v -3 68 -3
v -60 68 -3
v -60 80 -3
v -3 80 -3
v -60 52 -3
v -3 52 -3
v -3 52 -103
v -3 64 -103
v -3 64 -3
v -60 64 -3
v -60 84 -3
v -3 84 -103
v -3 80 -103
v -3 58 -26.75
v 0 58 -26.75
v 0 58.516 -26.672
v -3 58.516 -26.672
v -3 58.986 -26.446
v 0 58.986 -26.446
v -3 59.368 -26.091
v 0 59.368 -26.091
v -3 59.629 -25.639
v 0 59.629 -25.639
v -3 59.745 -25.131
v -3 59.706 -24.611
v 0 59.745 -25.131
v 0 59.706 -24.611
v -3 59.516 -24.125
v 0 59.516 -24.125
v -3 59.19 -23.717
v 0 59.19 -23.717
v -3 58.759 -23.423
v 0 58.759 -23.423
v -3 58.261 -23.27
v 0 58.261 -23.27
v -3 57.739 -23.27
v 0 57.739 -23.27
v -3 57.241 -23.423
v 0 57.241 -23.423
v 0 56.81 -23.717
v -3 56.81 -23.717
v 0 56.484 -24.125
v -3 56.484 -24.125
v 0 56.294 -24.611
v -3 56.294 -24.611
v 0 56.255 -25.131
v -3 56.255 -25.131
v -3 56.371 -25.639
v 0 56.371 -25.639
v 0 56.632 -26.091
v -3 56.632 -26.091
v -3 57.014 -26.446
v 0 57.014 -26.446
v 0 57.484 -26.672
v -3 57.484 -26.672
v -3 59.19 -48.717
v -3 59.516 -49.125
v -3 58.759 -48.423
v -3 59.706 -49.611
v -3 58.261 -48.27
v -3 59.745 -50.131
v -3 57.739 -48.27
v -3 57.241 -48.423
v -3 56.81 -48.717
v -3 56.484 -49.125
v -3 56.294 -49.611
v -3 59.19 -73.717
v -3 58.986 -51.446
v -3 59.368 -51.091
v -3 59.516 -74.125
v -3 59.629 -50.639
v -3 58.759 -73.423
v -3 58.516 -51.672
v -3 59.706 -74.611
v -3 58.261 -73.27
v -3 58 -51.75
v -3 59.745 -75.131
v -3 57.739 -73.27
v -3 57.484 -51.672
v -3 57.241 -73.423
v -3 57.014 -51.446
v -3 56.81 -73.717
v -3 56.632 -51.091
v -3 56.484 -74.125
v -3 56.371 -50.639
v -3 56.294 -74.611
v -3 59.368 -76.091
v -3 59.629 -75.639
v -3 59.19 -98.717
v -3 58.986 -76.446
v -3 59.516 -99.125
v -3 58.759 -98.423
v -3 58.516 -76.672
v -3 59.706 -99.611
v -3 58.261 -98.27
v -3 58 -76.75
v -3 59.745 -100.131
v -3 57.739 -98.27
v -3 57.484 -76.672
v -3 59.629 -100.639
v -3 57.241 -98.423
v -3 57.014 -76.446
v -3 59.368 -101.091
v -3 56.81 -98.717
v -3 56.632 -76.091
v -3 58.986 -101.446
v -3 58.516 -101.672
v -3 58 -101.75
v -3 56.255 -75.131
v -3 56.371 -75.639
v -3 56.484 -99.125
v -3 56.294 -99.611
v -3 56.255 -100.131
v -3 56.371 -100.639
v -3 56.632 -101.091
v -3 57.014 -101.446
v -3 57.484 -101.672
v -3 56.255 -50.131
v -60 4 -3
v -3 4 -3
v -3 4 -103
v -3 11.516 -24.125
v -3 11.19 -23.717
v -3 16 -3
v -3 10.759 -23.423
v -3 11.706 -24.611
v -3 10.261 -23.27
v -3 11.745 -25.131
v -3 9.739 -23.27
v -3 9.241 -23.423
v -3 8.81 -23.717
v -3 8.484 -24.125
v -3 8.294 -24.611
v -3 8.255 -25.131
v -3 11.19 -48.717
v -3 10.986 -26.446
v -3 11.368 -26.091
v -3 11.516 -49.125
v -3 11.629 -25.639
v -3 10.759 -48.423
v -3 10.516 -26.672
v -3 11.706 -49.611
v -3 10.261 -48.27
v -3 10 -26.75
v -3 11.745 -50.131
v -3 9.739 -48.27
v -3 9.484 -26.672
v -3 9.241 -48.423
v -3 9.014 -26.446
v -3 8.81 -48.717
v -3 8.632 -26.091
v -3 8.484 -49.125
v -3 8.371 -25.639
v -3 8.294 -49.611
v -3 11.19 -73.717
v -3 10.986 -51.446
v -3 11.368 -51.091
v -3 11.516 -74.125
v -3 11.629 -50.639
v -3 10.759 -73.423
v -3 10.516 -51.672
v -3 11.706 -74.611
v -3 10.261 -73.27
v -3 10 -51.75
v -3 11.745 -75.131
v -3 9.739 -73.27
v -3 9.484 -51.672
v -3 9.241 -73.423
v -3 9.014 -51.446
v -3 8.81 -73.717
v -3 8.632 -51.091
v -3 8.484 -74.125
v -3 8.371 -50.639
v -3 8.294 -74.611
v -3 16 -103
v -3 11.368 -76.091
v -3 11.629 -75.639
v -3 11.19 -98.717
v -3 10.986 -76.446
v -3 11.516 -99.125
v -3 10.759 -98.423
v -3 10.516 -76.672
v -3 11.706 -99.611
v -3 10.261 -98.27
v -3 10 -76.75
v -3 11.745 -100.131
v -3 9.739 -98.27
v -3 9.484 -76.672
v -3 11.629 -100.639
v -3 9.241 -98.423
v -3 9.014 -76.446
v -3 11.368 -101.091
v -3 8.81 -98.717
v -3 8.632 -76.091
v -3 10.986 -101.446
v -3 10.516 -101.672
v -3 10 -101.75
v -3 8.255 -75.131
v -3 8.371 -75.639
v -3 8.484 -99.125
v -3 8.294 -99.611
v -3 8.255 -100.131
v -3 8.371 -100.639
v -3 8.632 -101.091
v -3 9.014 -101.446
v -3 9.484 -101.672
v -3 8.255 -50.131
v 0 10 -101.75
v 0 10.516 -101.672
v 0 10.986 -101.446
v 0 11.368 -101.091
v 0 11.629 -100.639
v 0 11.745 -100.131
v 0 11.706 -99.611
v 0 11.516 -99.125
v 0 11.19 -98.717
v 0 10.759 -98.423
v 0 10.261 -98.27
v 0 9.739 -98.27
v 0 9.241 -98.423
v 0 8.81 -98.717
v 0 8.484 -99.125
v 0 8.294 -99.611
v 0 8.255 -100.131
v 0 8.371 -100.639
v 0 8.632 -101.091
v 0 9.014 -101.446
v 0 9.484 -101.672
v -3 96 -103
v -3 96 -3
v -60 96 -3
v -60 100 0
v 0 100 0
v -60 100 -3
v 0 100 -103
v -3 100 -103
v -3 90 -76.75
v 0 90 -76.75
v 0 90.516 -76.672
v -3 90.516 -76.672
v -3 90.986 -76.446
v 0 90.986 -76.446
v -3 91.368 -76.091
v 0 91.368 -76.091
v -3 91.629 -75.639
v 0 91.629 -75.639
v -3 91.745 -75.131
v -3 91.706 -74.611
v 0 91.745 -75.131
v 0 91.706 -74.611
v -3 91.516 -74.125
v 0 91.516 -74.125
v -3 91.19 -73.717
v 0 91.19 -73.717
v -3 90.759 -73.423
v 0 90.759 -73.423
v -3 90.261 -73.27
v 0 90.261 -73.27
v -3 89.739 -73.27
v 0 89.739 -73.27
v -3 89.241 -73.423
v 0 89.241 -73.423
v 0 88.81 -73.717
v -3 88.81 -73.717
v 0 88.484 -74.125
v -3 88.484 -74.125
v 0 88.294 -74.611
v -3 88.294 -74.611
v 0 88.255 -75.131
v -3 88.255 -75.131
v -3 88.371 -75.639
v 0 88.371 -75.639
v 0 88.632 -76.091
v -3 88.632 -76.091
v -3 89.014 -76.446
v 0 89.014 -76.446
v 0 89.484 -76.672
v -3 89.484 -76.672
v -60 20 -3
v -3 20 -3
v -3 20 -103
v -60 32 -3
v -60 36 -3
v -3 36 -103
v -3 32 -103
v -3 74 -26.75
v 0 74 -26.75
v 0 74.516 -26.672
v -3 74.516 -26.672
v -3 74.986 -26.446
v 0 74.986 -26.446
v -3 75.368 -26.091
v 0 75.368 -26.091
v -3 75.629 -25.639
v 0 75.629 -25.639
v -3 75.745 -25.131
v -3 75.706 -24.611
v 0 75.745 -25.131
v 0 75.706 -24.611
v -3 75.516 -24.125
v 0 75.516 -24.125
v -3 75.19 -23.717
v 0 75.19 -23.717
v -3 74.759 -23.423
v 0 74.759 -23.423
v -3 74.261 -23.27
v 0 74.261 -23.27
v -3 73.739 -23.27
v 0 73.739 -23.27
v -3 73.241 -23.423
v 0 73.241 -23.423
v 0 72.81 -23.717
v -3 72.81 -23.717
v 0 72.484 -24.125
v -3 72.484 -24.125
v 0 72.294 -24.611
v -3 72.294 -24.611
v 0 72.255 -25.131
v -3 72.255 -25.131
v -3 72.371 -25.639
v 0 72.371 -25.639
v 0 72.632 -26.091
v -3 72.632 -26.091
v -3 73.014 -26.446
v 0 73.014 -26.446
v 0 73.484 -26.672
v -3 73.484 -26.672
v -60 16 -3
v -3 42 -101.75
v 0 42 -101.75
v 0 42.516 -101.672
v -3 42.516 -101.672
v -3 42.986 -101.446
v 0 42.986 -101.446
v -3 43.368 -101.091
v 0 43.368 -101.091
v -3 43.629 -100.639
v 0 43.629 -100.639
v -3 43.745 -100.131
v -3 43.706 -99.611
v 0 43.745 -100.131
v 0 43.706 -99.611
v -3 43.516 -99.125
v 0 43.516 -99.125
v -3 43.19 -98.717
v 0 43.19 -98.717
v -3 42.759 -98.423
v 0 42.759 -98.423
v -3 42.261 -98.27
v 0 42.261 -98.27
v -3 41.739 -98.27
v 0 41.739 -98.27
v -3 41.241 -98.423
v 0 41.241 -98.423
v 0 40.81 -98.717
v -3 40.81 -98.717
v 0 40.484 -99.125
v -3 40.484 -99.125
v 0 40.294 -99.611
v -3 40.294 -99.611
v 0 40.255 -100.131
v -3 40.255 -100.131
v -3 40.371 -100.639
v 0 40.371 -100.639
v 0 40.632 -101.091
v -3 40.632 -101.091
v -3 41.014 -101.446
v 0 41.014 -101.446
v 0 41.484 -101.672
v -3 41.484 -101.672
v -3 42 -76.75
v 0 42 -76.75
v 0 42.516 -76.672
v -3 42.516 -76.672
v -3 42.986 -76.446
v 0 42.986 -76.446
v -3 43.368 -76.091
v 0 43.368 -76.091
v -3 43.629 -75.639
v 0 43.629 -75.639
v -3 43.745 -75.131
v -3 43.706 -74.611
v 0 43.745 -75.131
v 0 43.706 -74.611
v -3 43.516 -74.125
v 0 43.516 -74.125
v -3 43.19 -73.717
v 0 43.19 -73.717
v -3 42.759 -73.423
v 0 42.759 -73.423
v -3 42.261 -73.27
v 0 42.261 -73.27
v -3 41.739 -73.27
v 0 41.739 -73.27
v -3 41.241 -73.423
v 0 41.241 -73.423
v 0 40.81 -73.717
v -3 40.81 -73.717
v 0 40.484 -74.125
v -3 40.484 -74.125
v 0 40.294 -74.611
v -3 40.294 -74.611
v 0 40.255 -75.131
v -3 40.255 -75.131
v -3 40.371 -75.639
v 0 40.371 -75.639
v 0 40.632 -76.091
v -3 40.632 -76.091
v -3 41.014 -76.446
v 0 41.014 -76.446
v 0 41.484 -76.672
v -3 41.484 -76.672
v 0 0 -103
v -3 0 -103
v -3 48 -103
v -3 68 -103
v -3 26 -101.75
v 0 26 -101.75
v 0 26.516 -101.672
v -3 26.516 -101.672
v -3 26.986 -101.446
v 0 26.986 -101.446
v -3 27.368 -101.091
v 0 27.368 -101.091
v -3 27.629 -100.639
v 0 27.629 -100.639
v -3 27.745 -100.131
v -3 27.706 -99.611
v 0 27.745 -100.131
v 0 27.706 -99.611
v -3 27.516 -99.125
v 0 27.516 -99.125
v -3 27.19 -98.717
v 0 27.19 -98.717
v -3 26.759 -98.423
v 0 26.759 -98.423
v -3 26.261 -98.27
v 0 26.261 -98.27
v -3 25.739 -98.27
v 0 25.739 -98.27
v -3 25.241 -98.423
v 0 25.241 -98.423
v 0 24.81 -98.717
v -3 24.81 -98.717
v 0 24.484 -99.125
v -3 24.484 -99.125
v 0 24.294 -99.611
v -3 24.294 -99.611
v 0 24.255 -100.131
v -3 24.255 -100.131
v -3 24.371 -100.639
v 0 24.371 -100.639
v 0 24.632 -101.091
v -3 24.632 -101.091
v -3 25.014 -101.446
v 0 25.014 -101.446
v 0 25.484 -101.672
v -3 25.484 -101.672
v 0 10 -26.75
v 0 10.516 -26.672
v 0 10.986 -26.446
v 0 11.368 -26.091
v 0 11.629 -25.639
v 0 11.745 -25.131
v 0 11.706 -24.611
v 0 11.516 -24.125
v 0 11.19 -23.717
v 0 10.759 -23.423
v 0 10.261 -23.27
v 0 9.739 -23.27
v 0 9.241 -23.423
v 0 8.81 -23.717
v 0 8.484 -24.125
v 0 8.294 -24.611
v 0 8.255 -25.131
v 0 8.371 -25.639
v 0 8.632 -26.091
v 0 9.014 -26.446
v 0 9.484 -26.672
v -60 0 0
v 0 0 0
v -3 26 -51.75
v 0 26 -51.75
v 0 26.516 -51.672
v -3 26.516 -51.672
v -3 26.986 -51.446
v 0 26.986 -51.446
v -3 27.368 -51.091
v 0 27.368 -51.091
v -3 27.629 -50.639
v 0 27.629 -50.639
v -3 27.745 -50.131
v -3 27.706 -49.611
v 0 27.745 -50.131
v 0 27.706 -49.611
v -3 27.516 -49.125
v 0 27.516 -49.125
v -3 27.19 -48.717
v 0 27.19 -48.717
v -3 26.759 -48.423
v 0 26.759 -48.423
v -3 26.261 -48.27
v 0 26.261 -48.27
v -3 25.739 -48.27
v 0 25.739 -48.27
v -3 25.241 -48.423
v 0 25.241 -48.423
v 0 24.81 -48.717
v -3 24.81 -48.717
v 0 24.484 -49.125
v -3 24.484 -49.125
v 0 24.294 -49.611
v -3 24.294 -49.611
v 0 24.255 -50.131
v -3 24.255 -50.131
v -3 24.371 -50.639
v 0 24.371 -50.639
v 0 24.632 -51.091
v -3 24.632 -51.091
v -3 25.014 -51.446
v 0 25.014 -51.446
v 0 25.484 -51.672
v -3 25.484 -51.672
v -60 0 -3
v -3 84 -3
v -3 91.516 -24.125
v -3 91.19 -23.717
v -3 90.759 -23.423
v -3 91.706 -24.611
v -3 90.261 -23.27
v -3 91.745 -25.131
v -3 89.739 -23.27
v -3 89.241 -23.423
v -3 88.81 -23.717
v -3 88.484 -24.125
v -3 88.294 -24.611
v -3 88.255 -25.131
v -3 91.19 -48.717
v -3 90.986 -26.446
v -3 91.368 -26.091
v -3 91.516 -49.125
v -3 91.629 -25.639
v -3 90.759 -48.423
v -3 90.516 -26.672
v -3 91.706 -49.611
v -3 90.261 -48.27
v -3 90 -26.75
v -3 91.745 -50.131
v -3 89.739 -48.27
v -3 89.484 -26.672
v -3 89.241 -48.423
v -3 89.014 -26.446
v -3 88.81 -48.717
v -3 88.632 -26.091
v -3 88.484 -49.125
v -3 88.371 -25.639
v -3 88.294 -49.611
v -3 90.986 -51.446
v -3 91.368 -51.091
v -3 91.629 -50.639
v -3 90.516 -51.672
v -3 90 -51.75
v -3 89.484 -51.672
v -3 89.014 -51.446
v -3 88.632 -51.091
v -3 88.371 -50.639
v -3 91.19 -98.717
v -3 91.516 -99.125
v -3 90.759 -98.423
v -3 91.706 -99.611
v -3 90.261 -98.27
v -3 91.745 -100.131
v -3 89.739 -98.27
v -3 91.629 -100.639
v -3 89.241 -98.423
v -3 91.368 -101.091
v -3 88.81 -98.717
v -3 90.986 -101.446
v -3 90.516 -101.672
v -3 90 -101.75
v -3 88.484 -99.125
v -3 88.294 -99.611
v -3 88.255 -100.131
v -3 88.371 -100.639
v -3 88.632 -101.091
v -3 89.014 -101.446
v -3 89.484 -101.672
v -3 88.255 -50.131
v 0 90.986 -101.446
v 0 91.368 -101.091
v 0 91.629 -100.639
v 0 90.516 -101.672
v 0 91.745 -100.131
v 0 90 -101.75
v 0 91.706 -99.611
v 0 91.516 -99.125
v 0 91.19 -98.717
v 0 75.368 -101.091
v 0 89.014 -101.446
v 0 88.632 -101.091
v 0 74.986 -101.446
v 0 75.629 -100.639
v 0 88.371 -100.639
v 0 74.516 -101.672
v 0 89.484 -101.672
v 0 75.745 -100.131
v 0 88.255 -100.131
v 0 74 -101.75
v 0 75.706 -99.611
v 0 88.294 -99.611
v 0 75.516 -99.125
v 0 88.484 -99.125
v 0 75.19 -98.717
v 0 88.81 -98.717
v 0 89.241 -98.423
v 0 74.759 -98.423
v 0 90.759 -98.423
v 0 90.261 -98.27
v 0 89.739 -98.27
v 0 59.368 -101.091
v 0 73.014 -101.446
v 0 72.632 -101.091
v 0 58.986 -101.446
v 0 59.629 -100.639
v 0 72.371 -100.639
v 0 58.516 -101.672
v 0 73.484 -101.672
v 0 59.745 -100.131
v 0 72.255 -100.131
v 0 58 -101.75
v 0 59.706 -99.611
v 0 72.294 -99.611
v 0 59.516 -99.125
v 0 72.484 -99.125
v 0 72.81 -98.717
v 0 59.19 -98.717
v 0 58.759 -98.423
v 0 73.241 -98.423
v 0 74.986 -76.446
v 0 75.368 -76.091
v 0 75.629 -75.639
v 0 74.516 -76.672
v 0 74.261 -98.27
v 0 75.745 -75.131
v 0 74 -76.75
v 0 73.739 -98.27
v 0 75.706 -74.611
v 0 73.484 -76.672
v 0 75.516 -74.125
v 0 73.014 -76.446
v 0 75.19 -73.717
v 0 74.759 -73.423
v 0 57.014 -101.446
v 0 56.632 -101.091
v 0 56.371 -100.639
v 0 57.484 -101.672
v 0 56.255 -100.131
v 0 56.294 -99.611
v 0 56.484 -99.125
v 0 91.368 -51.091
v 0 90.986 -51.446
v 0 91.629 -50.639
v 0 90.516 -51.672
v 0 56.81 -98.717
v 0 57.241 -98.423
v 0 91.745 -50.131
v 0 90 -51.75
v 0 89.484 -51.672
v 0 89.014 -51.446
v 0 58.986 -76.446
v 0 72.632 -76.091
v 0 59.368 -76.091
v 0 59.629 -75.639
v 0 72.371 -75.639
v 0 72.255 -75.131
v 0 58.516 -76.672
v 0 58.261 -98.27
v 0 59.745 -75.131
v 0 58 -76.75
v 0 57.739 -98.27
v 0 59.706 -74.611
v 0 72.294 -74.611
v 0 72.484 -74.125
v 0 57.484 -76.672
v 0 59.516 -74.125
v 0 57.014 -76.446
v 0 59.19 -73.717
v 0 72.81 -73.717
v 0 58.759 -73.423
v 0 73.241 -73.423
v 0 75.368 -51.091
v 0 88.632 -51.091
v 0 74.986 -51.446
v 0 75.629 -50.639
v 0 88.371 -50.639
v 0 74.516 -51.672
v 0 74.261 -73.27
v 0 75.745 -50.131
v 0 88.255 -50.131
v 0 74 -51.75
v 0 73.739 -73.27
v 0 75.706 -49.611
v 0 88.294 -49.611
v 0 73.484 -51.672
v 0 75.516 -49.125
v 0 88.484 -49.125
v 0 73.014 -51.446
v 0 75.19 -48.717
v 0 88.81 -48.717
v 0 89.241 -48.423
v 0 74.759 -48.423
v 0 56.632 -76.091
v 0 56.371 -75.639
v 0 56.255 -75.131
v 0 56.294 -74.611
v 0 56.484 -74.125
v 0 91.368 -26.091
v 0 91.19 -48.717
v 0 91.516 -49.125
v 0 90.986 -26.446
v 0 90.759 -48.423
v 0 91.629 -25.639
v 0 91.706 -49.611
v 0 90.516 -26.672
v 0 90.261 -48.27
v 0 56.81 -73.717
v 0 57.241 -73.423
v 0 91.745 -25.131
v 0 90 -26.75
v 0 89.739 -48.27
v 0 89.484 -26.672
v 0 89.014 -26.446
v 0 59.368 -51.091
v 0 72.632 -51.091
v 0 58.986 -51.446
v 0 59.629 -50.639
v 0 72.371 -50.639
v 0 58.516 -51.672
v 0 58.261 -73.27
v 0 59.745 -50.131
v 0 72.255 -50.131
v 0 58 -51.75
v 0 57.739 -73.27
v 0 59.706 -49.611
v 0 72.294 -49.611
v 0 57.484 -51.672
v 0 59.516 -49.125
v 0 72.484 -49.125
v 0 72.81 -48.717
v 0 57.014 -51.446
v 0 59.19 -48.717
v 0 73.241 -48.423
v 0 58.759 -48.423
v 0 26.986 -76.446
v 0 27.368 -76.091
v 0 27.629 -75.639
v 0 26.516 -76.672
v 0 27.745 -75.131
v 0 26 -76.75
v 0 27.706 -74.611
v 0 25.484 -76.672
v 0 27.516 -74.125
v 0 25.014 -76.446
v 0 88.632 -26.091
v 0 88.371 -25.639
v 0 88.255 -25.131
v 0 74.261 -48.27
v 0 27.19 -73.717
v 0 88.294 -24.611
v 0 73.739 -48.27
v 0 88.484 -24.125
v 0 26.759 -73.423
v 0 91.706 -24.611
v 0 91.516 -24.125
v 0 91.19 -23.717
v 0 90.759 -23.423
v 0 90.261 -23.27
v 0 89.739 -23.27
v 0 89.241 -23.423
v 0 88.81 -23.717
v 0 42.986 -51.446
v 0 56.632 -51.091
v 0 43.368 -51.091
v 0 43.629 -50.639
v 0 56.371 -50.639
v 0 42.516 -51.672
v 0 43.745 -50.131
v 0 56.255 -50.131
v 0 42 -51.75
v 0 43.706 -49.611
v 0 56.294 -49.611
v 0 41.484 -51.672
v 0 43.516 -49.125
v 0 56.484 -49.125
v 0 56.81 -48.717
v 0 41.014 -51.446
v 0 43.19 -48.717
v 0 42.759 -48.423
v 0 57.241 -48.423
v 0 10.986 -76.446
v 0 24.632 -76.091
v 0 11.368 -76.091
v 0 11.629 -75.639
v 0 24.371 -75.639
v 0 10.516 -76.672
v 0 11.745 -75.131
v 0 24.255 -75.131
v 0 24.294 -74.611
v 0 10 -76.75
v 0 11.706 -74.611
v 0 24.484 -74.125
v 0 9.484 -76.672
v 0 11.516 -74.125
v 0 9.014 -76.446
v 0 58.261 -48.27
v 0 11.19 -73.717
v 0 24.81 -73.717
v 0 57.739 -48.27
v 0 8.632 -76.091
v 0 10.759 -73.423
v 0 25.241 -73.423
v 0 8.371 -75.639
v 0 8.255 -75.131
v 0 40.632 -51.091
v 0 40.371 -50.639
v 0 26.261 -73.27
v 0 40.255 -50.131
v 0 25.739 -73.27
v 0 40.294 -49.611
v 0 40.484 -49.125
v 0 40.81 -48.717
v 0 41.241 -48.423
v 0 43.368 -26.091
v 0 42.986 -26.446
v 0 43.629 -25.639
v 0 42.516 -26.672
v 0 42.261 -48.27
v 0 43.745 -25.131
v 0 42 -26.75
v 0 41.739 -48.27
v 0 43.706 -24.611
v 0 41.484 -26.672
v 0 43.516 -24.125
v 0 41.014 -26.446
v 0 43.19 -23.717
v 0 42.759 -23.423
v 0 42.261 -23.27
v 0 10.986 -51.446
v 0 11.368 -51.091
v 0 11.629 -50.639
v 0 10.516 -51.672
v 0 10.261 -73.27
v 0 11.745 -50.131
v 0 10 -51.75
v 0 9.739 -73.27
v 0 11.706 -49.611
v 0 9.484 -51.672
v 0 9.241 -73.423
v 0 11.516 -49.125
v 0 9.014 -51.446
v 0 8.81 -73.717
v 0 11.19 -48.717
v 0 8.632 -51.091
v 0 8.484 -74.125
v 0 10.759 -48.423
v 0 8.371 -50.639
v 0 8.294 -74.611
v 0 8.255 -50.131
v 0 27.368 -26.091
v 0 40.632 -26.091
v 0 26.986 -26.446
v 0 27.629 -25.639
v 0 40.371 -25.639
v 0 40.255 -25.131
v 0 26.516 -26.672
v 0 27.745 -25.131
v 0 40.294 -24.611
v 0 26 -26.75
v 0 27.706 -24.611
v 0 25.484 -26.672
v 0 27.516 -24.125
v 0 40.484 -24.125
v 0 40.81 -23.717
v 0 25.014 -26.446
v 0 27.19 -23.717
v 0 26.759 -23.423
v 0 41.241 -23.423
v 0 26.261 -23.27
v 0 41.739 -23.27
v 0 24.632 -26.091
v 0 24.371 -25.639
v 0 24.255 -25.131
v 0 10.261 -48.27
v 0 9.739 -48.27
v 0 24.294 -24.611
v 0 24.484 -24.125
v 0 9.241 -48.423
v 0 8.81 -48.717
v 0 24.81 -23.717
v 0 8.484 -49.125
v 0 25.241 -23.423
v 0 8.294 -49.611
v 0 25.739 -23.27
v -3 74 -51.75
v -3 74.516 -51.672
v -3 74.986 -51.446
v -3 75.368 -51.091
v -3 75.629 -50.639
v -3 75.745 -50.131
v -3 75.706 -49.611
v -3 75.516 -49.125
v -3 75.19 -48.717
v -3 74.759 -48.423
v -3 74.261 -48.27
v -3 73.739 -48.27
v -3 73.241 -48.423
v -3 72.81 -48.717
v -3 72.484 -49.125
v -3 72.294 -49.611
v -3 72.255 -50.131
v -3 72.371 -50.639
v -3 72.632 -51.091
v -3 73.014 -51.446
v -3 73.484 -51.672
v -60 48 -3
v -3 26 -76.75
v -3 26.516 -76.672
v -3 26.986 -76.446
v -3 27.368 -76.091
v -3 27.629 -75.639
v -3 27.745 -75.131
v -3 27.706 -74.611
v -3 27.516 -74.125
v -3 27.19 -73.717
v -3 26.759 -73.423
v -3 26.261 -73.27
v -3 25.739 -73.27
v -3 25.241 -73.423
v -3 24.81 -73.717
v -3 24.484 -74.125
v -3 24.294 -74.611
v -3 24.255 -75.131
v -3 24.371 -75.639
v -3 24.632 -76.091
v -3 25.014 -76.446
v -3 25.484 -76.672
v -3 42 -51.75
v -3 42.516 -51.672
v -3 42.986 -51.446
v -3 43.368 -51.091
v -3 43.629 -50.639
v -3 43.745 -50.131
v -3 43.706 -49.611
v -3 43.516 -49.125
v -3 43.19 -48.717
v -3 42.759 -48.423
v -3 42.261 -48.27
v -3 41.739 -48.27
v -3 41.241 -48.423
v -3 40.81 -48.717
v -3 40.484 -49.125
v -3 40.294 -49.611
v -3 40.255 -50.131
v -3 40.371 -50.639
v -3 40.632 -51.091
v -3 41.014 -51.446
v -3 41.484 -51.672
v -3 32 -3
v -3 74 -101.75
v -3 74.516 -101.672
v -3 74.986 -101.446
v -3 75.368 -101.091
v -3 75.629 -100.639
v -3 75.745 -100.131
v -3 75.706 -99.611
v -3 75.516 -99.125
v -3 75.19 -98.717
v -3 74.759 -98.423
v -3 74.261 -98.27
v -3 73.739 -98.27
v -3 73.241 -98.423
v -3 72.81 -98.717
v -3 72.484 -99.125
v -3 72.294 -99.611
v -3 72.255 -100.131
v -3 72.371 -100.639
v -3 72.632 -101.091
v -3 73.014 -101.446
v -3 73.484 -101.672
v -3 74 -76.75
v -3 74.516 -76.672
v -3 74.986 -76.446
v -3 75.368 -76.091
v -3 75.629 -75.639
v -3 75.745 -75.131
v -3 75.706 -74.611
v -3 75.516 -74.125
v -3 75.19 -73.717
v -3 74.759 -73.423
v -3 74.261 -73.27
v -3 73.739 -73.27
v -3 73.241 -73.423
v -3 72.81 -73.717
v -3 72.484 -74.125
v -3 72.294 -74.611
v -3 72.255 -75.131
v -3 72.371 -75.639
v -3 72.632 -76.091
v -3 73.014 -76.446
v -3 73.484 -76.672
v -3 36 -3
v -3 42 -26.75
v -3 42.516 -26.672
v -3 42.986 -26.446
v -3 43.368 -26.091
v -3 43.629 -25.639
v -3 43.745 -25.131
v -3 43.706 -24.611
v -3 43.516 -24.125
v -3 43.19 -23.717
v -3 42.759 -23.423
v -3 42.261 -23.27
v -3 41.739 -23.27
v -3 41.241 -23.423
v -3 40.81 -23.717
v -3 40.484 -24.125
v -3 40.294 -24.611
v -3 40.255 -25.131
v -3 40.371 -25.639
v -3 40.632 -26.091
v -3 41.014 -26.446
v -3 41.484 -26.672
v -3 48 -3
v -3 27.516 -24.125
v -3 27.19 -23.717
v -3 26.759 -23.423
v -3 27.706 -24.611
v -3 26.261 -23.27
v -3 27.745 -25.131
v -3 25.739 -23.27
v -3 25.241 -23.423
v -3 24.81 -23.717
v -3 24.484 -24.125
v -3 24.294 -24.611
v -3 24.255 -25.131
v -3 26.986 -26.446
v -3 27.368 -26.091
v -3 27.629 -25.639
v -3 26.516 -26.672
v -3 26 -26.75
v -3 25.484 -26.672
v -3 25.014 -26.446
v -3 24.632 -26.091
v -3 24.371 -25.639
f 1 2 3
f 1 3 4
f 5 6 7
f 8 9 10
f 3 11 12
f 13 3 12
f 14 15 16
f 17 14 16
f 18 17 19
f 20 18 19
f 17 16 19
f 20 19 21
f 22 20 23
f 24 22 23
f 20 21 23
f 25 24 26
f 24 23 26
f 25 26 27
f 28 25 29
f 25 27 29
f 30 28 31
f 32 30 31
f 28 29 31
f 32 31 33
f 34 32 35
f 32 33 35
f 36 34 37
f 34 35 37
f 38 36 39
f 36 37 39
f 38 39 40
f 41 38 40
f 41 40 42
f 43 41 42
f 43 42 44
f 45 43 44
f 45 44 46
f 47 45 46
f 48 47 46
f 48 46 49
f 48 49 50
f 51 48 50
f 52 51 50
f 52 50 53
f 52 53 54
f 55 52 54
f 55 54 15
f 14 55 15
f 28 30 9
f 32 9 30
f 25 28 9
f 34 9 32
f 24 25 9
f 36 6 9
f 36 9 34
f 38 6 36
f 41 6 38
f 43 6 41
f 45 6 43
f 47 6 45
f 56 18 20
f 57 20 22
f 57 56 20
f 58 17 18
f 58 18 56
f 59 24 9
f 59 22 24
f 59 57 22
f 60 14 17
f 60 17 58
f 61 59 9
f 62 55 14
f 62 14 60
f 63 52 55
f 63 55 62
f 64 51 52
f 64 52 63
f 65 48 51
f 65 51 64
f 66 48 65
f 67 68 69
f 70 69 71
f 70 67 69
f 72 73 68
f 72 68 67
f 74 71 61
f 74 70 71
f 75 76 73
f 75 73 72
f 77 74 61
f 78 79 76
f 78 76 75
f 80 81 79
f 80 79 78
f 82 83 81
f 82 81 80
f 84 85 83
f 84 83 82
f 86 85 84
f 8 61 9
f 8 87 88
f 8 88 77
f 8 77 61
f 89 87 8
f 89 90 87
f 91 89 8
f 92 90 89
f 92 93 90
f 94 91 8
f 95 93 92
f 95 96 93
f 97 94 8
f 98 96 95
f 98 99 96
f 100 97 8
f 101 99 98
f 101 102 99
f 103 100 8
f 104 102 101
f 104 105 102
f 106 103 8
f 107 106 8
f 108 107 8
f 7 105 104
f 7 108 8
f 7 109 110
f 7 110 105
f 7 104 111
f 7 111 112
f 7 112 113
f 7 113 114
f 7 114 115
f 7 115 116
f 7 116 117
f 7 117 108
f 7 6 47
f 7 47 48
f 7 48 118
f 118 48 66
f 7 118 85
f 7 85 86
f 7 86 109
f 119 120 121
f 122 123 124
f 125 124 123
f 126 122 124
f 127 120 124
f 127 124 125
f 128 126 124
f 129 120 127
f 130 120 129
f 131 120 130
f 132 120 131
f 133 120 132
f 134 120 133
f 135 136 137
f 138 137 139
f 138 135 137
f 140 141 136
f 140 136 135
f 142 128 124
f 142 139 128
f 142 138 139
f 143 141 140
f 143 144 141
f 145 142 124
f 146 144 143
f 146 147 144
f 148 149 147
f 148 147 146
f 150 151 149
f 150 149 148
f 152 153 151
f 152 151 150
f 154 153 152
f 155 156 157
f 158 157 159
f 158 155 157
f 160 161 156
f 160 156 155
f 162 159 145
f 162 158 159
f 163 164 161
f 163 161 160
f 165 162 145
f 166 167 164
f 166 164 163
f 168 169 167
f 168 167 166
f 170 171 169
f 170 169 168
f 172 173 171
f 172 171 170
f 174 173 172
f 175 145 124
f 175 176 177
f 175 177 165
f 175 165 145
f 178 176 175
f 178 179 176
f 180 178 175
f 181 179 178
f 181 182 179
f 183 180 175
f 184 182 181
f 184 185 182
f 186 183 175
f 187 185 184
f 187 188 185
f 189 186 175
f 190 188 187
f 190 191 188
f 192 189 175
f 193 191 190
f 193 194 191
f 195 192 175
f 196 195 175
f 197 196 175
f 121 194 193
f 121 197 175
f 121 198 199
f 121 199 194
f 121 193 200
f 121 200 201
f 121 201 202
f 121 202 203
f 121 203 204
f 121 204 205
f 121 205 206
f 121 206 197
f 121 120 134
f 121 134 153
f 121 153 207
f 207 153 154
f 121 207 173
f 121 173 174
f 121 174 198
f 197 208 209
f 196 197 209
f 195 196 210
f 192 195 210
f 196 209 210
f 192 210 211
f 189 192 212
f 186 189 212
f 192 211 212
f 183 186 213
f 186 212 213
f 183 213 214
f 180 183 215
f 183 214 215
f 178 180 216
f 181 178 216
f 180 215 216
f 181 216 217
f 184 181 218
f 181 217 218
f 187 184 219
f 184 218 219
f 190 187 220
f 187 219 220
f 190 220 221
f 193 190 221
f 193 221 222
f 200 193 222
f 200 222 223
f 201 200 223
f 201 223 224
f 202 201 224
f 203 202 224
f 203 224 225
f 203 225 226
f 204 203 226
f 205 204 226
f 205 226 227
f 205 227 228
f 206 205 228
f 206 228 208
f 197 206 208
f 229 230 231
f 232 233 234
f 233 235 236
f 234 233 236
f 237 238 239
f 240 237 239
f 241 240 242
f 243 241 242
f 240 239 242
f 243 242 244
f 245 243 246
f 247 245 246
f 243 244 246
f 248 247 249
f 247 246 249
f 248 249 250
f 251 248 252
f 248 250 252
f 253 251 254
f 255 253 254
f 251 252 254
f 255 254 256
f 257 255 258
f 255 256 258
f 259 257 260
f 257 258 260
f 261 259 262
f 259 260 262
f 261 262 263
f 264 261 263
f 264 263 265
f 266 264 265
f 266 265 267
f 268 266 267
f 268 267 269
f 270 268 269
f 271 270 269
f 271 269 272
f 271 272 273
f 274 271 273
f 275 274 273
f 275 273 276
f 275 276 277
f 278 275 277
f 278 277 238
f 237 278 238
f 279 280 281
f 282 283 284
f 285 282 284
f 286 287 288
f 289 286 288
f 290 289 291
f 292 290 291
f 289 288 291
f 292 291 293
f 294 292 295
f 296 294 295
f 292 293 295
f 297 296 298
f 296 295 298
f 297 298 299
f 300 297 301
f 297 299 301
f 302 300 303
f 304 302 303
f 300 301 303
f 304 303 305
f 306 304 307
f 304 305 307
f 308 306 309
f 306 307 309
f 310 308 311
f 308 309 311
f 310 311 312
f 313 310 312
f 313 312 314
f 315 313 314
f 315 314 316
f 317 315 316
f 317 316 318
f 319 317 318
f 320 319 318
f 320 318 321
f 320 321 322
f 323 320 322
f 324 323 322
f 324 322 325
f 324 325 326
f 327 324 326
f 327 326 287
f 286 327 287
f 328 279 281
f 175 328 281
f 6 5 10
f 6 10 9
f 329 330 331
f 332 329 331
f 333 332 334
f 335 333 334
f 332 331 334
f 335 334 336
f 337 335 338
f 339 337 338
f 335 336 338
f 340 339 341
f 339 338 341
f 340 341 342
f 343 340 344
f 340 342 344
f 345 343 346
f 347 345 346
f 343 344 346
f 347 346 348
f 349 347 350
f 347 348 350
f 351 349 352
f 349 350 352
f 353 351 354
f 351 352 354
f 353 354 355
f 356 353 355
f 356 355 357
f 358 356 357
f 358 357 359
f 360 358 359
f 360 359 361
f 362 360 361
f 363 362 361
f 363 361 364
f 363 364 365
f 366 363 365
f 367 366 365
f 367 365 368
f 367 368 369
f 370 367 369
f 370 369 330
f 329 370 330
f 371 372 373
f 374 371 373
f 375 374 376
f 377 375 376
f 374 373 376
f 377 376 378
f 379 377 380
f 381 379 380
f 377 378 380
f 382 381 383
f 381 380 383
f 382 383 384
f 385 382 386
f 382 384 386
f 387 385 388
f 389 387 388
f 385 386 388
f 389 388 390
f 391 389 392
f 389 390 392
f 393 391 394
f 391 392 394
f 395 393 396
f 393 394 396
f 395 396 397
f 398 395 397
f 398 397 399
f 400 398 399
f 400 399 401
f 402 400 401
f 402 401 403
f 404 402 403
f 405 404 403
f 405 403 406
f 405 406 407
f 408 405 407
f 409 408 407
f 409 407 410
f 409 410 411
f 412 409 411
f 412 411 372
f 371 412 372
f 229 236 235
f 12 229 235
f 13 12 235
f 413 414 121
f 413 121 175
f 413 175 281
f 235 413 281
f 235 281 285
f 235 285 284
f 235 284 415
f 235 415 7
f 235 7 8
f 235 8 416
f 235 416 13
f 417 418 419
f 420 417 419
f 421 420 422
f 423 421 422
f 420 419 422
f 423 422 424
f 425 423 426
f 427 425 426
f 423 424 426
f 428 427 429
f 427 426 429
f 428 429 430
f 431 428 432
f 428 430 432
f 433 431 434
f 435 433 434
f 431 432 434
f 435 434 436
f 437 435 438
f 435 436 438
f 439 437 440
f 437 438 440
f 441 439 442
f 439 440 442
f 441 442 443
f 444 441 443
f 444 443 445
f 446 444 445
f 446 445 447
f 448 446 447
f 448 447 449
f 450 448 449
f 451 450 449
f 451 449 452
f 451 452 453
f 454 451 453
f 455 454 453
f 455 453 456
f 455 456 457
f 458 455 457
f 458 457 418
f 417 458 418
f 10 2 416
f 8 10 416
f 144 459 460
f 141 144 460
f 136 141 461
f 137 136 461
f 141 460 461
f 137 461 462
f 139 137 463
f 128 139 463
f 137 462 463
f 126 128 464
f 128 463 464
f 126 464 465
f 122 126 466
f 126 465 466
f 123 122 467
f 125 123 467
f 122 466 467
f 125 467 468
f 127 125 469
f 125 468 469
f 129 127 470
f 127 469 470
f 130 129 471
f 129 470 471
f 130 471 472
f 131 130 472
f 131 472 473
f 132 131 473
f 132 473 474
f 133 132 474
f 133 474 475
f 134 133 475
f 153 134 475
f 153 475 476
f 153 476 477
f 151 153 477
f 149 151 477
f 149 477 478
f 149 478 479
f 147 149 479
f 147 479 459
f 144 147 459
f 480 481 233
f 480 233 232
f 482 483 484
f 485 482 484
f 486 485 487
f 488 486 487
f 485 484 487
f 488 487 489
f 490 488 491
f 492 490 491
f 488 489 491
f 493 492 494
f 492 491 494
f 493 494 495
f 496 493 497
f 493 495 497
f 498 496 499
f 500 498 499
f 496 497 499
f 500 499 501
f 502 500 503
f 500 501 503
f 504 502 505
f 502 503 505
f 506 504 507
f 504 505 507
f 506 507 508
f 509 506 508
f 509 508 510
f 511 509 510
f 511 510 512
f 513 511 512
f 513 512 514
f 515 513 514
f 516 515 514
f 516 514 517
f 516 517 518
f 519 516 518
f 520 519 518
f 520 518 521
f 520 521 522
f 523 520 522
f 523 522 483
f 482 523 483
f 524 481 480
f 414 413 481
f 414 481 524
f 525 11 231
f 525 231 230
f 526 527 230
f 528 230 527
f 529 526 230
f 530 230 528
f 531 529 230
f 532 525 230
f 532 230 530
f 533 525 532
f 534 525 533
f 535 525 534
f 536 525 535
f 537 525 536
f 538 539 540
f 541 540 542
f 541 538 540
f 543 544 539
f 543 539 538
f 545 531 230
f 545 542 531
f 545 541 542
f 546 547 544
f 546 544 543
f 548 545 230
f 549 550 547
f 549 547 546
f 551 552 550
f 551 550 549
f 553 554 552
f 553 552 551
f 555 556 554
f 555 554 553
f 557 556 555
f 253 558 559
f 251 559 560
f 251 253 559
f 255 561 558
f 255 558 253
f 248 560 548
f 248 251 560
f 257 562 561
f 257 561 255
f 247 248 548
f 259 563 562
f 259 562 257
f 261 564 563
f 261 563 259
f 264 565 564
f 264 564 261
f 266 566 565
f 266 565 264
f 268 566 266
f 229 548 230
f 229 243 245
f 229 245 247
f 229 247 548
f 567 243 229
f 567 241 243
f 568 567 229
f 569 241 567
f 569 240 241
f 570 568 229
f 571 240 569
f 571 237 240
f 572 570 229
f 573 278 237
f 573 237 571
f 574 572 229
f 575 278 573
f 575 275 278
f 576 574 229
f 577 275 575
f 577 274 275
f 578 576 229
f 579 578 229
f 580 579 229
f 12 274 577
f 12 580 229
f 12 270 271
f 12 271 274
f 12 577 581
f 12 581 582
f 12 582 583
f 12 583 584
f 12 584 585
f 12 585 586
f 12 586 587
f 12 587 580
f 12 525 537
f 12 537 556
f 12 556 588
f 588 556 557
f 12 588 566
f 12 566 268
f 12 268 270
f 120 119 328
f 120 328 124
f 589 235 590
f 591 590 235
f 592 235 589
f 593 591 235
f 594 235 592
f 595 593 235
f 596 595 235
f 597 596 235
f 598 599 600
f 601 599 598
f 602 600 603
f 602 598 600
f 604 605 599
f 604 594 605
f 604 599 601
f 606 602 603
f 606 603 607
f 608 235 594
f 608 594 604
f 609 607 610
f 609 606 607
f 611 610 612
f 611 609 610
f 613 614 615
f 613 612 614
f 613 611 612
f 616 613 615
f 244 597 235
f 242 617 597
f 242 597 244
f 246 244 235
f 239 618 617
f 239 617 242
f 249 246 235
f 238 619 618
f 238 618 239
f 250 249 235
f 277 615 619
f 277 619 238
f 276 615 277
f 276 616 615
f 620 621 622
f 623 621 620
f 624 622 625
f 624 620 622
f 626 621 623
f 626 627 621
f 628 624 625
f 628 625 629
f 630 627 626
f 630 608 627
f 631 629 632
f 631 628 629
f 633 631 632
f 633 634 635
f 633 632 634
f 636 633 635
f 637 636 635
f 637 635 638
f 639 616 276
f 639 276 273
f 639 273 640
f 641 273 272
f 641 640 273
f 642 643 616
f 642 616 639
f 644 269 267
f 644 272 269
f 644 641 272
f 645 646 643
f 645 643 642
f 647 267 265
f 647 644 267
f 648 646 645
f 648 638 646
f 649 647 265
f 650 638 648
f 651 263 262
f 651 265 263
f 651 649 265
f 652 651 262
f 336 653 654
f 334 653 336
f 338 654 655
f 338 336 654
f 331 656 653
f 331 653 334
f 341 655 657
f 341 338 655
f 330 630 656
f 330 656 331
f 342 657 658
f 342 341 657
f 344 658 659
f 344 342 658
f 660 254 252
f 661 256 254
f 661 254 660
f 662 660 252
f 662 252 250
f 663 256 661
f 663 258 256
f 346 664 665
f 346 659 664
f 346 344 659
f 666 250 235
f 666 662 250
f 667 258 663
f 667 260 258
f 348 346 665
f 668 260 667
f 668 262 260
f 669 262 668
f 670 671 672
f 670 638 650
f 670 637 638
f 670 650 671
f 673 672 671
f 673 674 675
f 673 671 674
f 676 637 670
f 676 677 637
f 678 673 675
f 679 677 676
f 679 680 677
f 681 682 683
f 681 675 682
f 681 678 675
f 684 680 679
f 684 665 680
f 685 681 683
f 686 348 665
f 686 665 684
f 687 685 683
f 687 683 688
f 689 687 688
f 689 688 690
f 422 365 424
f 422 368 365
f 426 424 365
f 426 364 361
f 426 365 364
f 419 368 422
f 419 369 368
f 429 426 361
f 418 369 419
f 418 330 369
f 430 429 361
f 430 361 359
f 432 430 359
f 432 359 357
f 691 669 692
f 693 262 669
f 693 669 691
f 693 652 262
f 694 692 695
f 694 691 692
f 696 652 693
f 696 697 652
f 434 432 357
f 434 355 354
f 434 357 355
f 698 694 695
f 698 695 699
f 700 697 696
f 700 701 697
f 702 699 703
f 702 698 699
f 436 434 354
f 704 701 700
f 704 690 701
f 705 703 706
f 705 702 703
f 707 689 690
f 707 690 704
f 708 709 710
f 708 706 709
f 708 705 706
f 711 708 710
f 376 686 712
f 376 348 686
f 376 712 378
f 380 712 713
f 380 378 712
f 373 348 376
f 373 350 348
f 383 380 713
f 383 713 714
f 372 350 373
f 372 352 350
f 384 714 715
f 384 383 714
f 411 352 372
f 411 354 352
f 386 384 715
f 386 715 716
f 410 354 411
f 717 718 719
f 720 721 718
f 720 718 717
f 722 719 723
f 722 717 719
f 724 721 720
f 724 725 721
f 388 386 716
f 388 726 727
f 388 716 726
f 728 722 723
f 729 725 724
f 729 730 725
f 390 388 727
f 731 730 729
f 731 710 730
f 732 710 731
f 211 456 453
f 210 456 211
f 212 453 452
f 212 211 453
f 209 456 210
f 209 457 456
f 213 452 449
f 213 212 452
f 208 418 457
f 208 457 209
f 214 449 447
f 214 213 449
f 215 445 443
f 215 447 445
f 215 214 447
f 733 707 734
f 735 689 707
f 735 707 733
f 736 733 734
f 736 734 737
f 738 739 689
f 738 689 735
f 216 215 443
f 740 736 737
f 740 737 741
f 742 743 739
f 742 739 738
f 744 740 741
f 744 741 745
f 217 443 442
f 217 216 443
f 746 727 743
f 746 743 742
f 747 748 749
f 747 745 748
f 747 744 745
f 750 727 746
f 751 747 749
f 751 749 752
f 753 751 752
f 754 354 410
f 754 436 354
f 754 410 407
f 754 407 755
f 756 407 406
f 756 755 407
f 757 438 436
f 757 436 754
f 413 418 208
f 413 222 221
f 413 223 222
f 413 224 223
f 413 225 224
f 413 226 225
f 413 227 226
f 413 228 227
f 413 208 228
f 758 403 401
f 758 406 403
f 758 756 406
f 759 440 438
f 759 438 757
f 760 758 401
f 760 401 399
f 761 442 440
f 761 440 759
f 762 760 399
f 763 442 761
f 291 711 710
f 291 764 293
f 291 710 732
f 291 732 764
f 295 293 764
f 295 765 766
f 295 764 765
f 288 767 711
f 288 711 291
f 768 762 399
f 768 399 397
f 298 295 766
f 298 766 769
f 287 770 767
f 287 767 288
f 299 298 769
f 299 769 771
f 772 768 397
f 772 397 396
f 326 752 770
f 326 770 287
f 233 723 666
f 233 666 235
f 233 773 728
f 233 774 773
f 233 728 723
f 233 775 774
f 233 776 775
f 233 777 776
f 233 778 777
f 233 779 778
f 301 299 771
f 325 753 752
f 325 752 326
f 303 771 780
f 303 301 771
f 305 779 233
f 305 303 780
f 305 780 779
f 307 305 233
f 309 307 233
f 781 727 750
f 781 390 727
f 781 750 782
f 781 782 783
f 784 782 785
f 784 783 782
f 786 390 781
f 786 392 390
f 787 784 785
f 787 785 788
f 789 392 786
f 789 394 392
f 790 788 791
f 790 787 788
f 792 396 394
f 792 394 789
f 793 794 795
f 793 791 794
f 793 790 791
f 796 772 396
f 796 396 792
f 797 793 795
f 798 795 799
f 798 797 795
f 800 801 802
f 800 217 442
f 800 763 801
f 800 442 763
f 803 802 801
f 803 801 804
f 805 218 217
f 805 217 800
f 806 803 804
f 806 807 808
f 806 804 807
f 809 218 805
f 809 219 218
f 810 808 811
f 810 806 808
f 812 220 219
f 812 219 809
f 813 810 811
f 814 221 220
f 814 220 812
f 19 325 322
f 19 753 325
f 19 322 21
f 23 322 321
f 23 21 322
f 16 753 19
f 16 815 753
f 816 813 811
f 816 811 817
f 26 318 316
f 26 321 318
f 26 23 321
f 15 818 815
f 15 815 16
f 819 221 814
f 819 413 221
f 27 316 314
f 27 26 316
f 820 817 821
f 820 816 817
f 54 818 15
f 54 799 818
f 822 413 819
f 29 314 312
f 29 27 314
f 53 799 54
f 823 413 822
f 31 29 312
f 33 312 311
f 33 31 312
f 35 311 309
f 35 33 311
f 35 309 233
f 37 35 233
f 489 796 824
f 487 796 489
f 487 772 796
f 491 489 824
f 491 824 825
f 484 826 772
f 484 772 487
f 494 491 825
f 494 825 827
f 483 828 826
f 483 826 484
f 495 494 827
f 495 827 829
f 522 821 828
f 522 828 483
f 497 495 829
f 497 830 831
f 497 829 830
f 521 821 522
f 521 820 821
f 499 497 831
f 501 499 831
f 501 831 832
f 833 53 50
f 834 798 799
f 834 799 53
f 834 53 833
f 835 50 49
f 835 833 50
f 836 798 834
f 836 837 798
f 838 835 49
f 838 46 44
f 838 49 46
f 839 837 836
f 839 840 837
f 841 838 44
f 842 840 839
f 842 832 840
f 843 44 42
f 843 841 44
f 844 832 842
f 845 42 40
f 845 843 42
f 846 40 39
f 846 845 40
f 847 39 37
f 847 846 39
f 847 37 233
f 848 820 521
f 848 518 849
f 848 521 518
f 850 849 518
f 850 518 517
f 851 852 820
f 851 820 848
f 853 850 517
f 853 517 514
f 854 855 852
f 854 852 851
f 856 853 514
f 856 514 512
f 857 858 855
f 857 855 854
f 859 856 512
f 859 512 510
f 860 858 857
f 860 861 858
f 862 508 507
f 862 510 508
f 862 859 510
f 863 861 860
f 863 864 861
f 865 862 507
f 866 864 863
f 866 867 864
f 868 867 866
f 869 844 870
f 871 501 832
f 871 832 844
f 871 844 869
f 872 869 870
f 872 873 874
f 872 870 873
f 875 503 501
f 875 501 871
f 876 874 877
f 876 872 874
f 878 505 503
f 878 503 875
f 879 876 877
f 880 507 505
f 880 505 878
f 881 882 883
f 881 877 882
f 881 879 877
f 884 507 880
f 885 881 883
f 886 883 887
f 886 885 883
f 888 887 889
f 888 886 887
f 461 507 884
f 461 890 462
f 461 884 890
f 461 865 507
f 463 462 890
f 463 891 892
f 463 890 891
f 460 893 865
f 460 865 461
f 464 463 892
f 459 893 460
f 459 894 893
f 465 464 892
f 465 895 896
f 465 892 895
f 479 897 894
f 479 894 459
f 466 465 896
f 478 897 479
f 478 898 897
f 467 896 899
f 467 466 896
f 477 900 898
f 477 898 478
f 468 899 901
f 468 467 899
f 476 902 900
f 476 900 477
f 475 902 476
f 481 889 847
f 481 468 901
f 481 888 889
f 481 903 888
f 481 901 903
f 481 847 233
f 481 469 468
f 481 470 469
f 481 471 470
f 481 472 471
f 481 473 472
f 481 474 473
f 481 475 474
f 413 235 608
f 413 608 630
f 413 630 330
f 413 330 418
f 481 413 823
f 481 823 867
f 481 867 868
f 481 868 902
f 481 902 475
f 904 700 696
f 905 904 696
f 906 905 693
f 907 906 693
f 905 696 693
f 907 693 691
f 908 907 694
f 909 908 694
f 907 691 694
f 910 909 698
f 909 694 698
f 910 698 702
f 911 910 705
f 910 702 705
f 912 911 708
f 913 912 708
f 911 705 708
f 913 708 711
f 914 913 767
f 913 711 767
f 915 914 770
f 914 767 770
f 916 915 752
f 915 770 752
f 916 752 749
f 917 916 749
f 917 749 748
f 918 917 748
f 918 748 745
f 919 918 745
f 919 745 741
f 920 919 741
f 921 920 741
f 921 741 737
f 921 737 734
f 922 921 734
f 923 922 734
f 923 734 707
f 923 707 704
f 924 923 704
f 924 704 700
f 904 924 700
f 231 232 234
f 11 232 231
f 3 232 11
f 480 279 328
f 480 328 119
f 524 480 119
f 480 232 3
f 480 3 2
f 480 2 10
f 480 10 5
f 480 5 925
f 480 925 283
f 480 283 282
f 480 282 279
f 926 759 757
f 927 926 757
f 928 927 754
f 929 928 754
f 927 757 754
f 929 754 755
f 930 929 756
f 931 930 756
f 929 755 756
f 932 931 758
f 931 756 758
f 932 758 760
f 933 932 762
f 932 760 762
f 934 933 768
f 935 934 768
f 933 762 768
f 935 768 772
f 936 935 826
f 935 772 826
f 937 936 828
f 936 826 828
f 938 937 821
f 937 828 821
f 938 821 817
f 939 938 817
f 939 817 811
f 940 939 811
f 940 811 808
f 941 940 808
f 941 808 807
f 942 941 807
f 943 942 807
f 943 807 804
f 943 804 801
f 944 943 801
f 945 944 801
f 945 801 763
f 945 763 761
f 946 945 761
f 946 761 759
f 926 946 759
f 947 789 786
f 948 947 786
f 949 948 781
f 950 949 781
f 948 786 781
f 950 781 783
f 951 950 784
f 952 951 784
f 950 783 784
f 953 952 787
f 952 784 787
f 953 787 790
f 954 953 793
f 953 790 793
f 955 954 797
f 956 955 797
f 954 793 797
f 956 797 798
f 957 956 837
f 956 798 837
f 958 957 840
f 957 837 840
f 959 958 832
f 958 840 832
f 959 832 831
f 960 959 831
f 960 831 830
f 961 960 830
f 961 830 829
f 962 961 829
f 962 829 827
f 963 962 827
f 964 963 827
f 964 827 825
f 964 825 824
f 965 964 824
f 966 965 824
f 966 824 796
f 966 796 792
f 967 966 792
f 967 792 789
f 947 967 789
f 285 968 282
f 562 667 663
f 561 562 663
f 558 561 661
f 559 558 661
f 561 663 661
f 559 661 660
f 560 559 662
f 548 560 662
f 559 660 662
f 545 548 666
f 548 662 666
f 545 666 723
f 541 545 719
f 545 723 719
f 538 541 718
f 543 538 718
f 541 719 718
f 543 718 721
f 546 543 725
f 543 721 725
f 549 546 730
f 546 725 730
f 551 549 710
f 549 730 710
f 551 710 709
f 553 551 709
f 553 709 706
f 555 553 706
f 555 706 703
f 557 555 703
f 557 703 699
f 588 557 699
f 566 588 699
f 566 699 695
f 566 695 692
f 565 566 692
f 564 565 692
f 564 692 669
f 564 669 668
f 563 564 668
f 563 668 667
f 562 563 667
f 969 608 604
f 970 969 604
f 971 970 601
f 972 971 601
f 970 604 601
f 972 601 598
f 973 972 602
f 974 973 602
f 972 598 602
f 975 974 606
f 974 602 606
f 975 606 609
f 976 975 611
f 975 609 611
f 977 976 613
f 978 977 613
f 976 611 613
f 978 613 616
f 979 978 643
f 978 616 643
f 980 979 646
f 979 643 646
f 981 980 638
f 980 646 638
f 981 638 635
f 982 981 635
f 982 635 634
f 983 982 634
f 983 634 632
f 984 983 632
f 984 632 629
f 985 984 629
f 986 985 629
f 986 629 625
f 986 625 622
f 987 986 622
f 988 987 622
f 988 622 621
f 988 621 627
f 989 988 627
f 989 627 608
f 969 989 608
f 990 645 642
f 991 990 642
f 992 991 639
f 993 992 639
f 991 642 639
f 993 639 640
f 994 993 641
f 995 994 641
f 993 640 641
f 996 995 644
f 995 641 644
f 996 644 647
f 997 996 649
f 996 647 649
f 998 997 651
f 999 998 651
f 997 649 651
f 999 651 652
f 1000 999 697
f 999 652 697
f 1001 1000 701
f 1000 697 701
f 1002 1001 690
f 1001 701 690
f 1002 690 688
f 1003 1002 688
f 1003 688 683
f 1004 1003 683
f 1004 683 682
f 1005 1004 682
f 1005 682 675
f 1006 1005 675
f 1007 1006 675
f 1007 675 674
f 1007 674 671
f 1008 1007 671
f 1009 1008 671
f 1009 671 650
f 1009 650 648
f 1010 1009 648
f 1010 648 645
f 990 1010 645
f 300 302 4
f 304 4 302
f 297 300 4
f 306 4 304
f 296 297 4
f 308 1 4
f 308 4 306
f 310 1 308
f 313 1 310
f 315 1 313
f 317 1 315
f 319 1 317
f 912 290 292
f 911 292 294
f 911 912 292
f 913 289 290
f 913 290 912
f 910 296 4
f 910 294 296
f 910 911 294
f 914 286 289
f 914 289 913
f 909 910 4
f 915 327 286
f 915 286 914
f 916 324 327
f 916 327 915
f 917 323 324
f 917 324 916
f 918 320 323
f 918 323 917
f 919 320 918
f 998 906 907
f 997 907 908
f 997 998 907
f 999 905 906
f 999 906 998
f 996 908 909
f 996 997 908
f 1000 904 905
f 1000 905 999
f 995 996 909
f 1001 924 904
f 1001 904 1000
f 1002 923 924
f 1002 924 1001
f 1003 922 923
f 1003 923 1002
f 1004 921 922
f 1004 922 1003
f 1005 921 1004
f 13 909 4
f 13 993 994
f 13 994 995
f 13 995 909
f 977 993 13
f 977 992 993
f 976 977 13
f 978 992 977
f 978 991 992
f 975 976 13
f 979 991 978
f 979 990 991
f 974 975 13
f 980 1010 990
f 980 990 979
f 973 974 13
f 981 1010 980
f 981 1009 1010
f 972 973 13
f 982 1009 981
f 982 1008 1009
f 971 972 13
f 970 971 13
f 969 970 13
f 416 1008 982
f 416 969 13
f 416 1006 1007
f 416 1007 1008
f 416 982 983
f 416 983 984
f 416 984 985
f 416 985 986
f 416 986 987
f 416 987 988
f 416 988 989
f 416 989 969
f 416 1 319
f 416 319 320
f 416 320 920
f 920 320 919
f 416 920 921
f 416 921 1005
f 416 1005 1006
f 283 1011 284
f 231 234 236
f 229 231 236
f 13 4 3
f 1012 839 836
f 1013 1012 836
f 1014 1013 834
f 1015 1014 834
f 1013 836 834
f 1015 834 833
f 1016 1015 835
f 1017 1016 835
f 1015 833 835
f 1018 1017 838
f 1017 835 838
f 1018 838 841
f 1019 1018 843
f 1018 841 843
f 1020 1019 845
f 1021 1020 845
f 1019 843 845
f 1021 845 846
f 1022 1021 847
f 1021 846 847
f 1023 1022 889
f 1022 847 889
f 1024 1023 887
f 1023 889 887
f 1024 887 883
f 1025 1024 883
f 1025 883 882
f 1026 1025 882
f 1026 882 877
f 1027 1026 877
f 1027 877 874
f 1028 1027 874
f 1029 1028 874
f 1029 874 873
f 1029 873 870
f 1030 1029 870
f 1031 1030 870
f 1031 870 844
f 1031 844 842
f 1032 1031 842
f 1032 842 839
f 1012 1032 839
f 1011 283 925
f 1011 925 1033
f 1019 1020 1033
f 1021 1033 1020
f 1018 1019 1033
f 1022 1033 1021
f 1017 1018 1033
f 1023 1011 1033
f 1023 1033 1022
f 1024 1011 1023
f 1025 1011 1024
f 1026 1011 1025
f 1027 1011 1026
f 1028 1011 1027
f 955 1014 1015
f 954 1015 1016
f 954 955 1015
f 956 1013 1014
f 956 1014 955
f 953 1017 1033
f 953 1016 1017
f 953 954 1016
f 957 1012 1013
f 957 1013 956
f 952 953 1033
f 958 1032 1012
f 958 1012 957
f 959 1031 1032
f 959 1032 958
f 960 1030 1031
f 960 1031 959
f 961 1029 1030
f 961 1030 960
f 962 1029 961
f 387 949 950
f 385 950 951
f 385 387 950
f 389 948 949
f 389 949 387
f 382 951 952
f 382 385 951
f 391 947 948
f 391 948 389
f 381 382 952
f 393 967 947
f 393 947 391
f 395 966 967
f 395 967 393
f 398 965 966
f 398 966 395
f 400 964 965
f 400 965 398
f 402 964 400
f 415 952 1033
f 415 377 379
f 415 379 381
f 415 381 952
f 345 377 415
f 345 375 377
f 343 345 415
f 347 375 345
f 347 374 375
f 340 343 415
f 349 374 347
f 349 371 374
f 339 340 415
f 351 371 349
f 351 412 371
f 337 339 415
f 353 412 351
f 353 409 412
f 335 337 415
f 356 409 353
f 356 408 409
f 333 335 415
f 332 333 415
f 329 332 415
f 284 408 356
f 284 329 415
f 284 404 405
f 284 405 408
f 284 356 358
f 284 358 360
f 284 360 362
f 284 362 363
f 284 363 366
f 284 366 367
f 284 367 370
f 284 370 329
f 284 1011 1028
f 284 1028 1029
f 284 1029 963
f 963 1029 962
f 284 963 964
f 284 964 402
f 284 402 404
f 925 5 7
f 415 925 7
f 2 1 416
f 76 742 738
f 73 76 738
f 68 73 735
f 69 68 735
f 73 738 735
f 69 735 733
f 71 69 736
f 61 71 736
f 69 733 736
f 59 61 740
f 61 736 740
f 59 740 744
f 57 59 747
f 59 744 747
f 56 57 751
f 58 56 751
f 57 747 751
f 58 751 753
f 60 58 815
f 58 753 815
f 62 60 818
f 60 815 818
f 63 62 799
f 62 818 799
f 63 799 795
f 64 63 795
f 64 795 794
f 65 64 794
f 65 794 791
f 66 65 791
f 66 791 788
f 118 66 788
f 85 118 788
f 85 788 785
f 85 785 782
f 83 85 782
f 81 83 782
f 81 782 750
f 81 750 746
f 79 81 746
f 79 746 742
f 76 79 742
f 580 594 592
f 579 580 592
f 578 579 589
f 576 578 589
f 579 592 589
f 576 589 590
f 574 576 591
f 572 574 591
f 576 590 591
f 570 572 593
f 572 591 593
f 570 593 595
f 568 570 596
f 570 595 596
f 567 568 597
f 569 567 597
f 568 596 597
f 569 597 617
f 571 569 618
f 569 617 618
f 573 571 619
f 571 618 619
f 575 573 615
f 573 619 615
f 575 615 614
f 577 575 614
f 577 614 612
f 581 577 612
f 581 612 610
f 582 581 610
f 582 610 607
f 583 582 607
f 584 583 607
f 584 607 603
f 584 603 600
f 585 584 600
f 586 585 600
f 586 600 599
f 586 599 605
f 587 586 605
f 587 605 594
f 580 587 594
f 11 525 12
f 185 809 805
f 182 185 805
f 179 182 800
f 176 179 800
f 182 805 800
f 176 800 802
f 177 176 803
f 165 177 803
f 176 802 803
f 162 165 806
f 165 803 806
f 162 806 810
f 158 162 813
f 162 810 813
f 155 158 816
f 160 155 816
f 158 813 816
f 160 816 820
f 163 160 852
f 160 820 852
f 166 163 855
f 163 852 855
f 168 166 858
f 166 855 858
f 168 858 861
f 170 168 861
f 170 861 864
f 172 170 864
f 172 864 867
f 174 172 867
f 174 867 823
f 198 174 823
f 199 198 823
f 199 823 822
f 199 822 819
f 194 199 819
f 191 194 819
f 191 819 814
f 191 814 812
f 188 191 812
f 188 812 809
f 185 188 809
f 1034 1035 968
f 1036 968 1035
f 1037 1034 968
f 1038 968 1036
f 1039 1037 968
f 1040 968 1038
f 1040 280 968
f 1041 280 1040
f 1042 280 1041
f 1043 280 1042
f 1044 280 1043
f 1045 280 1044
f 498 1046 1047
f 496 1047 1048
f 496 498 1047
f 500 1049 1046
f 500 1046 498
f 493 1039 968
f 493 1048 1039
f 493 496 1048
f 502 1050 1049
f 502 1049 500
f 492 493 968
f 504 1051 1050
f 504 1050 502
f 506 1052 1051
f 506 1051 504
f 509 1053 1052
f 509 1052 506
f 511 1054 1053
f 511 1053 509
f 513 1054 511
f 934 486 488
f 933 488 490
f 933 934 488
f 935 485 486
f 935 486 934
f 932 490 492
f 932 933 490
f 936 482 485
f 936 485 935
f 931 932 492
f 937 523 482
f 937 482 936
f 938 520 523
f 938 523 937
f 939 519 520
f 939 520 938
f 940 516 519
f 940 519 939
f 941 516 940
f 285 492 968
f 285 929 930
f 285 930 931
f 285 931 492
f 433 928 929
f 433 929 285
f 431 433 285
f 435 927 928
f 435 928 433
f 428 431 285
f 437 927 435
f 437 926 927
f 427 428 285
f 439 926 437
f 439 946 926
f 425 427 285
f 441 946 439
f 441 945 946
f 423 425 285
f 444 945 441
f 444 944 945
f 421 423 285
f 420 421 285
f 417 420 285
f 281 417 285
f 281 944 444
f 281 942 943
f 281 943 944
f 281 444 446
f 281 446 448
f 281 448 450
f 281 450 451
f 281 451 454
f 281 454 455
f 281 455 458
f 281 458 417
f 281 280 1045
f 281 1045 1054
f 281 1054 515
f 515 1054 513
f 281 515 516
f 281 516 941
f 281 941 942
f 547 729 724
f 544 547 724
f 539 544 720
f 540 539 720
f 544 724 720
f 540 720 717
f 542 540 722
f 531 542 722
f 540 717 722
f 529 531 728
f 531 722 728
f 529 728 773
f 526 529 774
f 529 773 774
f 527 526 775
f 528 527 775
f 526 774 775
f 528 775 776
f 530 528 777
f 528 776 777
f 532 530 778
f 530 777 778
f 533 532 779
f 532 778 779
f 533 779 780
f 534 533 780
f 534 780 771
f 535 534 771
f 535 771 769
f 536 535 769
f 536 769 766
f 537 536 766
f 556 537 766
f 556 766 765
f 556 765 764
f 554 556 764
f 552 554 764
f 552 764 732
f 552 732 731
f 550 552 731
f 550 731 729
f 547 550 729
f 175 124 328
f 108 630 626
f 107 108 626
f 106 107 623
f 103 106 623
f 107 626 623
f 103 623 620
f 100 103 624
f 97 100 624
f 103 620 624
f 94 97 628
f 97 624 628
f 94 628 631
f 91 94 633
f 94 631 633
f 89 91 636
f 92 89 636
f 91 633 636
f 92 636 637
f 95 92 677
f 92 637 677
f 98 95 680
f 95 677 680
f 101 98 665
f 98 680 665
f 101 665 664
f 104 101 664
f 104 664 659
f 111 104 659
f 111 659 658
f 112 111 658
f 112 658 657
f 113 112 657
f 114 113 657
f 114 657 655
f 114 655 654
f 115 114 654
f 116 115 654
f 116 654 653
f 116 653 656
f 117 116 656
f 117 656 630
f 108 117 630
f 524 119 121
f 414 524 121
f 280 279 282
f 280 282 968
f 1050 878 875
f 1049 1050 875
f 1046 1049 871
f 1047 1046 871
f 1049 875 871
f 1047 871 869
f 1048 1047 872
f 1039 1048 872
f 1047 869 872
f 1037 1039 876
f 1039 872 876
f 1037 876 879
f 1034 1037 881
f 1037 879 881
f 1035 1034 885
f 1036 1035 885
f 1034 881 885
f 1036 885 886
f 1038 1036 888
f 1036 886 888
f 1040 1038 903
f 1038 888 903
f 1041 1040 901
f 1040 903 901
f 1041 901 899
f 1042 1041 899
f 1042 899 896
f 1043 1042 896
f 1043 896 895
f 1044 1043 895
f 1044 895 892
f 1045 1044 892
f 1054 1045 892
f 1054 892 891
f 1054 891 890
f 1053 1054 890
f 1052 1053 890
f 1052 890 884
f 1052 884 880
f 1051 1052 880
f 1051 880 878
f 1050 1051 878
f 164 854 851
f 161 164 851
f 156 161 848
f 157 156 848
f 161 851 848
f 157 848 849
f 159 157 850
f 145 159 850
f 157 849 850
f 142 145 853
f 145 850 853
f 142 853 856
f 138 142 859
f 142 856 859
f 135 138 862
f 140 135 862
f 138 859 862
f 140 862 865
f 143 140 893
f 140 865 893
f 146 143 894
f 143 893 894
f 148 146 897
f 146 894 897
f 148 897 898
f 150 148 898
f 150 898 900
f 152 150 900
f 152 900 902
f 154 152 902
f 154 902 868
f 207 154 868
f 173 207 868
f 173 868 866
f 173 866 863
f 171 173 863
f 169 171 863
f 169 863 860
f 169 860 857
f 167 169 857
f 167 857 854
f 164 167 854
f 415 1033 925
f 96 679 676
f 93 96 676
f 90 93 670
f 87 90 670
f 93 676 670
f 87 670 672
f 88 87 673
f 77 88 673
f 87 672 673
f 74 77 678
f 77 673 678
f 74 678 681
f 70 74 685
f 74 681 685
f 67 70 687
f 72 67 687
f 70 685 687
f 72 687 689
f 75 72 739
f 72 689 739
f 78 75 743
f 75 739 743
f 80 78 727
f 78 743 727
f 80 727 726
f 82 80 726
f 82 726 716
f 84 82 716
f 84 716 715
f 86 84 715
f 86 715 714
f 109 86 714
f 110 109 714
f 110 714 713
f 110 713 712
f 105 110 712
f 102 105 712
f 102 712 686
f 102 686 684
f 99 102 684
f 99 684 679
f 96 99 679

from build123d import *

# Parameters (mm, degrees)
BOSS_EXTRUDE1_DEPTH = 100
BOSS_EXTRUDE2_DEPTH = 4
LPATTERN1_COUNT     = 7
LPATTERN1_PITCH     = 16
SKETCH3_R           = 1.75
CUT_EXTRUDE1_DEPTH  = 10


with BuildPart() as part:
    # Sketch1 → Boss-Extrude1 (new body)
    with BuildSketch(Plane(origin=(0, 0, 0), x_dir=(1, 0, 0), z_dir=(0, 1, 0))):
        Polygon((0, 0), (-60, 0), (-60, 3), (-3, 3), (-3, 103), (0, 103), align=None)
    extrude(amount=BOSS_EXTRUDE1_DEPTH)

    # Sketch2 → Boss-Extrude2 (add)
    with BuildSketch(Plane(origin=(0, 100, 0), x_dir=(1, 0, 0), z_dir=(0, 1, 0))):
        Polygon((-60, 3), (-3, 103), (-3, 3), align=None)
    boss_extrude2 = extrude(amount=-BOSS_EXTRUDE2_DEPTH)

    # LPattern1: Boss-Extrude2 ×7
    with Locations(*[(0, -i * LPATTERN1_PITCH, 0) for i in range(1, LPATTERN1_COUNT)]):
        add(boss_extrude2)

    # Sketch3 → Cut-Extrude1 (cut)
    with BuildSketch(Plane(origin=(0, 0, 0), x_dir=(0, 0, -1), z_dir=(1, 0, 0))):
        with Locations((25, 10)):
            Circle(SKETCH3_R)
        with Locations((50, 10)):
            Circle(SKETCH3_R)
        with Locations((75, 10)):
            Circle(SKETCH3_R)
        with Locations((100, 10)):
            Circle(SKETCH3_R)
        with Locations((50, 26)):
            Circle(SKETCH3_R)
        with Locations((75, 26)):
            Circle(SKETCH3_R)
        with Locations((100, 26)):
            Circle(SKETCH3_R)
        with Locations((50, 42)):
            Circle(SKETCH3_R)
        with Locations((75, 42)):
            Circle(SKETCH3_R)
        with Locations((100, 42)):
            Circle(SKETCH3_R)
        with Locations((50, 58)):
            Circle(SKETCH3_R)
        with Locations((75, 58)):
            Circle(SKETCH3_R)
        with Locations((100, 58)):
            Circle(SKETCH3_R)
        with Locations((50, 74)):
            Circle(SKETCH3_R)
        with Locations((75, 74)):
            Circle(SKETCH3_R)
        with Locations((100, 74)):
            Circle(SKETCH3_R)
        with Locations((50, 90)):
            Circle(SKETCH3_R)
        with Locations((75, 90)):
            Circle(SKETCH3_R)
        with Locations((100, 90)):
            Circle(SKETCH3_R)
        with Locations((25, 26)):
            Circle(SKETCH3_R)
        with Locations((25, 42)):
            Circle(SKETCH3_R)
        with Locations((25, 58)):
            Circle(SKETCH3_R)
        with Locations((25, 74)):
            Circle(SKETCH3_R)
        with Locations((25, 90)):
            Circle(SKETCH3_R)
    extrude(amount=-CUT_EXTRUDE1_DEPTH, mode=Mode.SUBTRACT)


solid = part.part
